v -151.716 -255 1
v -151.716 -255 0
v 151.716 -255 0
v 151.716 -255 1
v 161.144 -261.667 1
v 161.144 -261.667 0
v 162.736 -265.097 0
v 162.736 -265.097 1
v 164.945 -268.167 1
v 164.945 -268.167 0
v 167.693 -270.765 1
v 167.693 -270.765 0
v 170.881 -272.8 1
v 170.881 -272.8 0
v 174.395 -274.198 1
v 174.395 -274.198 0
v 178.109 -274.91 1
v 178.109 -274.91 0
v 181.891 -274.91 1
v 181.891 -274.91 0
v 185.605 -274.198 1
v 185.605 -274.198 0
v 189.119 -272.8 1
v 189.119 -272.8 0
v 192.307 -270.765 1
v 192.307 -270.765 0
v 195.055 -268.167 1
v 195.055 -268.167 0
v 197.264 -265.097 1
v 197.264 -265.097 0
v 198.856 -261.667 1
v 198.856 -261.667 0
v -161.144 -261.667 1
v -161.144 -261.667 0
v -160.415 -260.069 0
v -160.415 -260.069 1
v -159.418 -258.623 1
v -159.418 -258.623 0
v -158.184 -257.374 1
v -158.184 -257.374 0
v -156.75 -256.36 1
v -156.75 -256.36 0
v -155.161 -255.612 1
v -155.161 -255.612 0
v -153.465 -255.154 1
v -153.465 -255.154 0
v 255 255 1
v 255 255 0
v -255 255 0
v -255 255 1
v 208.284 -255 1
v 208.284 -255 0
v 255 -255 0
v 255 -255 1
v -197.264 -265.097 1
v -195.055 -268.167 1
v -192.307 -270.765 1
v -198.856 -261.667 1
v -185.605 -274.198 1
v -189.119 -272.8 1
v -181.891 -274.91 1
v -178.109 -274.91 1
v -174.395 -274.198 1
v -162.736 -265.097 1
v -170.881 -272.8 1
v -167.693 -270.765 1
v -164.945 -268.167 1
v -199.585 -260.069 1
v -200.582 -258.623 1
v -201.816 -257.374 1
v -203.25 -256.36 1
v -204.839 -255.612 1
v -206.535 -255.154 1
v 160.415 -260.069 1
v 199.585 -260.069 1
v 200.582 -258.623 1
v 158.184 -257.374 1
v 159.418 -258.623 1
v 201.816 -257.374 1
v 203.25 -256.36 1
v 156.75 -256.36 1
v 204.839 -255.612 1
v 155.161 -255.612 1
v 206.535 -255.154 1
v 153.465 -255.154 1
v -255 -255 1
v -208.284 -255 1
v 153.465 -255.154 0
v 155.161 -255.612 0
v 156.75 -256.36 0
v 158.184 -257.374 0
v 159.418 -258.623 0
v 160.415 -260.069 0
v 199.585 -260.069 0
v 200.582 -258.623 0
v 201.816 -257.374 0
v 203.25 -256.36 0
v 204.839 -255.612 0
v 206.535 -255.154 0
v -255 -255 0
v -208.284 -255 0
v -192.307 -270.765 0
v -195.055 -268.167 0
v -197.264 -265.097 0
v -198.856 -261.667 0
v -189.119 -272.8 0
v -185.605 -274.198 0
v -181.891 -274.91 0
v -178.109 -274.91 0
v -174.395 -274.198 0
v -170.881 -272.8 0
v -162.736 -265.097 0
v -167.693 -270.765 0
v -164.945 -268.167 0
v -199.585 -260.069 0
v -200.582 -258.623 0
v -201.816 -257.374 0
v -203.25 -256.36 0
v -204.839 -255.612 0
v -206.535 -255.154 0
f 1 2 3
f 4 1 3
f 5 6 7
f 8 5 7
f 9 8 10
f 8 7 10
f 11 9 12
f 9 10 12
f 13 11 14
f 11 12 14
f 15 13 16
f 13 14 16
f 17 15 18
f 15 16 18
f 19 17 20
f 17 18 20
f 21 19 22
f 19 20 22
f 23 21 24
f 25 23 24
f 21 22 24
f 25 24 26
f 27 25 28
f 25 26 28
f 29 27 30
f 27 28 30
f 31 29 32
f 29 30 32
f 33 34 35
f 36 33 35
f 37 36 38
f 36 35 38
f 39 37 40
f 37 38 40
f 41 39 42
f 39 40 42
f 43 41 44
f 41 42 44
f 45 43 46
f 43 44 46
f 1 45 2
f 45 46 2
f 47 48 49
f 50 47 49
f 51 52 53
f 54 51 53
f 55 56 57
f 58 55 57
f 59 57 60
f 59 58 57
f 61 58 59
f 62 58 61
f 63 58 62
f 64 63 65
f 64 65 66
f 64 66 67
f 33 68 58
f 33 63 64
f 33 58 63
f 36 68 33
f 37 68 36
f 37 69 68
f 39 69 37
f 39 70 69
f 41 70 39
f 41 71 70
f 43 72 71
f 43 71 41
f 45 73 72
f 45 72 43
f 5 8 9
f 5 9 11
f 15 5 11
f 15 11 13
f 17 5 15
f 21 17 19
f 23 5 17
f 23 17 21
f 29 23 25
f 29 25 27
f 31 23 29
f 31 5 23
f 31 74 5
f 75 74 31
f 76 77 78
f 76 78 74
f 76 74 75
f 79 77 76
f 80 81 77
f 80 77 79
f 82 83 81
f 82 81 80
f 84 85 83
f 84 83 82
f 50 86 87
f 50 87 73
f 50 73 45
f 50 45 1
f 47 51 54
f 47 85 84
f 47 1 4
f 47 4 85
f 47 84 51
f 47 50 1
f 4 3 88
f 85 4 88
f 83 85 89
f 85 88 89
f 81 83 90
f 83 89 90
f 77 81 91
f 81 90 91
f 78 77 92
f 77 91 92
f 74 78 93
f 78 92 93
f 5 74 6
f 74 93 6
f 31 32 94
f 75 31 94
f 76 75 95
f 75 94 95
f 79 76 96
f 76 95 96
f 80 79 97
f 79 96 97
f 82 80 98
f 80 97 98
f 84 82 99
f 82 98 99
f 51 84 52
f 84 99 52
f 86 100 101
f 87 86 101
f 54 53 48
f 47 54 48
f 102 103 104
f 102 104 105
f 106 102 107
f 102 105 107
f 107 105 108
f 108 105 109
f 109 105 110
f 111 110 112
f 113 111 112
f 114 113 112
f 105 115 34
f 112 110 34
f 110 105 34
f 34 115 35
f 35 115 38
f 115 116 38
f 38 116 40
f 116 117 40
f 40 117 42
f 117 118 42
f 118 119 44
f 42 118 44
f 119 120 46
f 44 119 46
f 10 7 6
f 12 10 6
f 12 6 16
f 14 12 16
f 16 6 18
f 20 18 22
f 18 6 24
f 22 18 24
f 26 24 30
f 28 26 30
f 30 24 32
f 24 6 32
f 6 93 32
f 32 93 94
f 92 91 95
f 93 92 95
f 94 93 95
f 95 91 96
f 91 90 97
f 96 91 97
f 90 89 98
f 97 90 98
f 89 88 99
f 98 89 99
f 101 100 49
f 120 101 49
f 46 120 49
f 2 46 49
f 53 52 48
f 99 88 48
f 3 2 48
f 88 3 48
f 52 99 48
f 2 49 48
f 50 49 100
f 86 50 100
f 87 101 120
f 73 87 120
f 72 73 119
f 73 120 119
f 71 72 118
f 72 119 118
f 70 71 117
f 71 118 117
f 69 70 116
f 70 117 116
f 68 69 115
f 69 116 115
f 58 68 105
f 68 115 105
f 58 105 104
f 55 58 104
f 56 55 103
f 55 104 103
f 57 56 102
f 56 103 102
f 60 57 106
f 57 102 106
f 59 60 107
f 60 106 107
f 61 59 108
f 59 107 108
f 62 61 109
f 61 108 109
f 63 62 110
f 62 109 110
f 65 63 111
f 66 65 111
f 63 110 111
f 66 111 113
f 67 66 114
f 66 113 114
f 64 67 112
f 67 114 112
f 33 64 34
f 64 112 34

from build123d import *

# Parameters (mm, degrees)
BOSS_EXTRUDE1_DEPTH = 1


with BuildPart() as part:
    # Sketch1 → Boss-Extrude1 (new body)
    with BuildSketch(Plane.XY):
        with BuildLine():
            Line((208.284271247, -255), (255, -255))
            Line((255, -255), (255, 255))
            Line((255, 255), (-255, 255))
            Line((-255, 255), (-255, -255))
            Line((-255, -255), (-208.284271247, -255))
            ThreePointArc((-208.284271247, -255), (-202.510768556, -256.835034191), (-198.856180832, -261.666666667))
            ThreePointArc((-198.856180832, -261.666666667), (-180, -275), (-161.143819168, -261.666666667))
            ThreePointArc((-161.143819168, -261.666666667), (-157.489231444, -256.835034191), (-151.715728753, -255))
            Line((-151.715728753, -255), (151.715728753, -255))
            ThreePointArc((151.715728753, -255), (157.489231444, -256.835034191), (161.143819168, -261.666666667))
            ThreePointArc((161.143819168, -261.666666667), (180, -275), (198.856180832, -261.666666667))
            ThreePointArc((198.856180832, -261.666666667), (202.510768556, -256.835034191), (208.284271247, -255))
        make_face()
    extrude(amount=BOSS_EXTRUDE1_DEPTH)


solid = part.part
